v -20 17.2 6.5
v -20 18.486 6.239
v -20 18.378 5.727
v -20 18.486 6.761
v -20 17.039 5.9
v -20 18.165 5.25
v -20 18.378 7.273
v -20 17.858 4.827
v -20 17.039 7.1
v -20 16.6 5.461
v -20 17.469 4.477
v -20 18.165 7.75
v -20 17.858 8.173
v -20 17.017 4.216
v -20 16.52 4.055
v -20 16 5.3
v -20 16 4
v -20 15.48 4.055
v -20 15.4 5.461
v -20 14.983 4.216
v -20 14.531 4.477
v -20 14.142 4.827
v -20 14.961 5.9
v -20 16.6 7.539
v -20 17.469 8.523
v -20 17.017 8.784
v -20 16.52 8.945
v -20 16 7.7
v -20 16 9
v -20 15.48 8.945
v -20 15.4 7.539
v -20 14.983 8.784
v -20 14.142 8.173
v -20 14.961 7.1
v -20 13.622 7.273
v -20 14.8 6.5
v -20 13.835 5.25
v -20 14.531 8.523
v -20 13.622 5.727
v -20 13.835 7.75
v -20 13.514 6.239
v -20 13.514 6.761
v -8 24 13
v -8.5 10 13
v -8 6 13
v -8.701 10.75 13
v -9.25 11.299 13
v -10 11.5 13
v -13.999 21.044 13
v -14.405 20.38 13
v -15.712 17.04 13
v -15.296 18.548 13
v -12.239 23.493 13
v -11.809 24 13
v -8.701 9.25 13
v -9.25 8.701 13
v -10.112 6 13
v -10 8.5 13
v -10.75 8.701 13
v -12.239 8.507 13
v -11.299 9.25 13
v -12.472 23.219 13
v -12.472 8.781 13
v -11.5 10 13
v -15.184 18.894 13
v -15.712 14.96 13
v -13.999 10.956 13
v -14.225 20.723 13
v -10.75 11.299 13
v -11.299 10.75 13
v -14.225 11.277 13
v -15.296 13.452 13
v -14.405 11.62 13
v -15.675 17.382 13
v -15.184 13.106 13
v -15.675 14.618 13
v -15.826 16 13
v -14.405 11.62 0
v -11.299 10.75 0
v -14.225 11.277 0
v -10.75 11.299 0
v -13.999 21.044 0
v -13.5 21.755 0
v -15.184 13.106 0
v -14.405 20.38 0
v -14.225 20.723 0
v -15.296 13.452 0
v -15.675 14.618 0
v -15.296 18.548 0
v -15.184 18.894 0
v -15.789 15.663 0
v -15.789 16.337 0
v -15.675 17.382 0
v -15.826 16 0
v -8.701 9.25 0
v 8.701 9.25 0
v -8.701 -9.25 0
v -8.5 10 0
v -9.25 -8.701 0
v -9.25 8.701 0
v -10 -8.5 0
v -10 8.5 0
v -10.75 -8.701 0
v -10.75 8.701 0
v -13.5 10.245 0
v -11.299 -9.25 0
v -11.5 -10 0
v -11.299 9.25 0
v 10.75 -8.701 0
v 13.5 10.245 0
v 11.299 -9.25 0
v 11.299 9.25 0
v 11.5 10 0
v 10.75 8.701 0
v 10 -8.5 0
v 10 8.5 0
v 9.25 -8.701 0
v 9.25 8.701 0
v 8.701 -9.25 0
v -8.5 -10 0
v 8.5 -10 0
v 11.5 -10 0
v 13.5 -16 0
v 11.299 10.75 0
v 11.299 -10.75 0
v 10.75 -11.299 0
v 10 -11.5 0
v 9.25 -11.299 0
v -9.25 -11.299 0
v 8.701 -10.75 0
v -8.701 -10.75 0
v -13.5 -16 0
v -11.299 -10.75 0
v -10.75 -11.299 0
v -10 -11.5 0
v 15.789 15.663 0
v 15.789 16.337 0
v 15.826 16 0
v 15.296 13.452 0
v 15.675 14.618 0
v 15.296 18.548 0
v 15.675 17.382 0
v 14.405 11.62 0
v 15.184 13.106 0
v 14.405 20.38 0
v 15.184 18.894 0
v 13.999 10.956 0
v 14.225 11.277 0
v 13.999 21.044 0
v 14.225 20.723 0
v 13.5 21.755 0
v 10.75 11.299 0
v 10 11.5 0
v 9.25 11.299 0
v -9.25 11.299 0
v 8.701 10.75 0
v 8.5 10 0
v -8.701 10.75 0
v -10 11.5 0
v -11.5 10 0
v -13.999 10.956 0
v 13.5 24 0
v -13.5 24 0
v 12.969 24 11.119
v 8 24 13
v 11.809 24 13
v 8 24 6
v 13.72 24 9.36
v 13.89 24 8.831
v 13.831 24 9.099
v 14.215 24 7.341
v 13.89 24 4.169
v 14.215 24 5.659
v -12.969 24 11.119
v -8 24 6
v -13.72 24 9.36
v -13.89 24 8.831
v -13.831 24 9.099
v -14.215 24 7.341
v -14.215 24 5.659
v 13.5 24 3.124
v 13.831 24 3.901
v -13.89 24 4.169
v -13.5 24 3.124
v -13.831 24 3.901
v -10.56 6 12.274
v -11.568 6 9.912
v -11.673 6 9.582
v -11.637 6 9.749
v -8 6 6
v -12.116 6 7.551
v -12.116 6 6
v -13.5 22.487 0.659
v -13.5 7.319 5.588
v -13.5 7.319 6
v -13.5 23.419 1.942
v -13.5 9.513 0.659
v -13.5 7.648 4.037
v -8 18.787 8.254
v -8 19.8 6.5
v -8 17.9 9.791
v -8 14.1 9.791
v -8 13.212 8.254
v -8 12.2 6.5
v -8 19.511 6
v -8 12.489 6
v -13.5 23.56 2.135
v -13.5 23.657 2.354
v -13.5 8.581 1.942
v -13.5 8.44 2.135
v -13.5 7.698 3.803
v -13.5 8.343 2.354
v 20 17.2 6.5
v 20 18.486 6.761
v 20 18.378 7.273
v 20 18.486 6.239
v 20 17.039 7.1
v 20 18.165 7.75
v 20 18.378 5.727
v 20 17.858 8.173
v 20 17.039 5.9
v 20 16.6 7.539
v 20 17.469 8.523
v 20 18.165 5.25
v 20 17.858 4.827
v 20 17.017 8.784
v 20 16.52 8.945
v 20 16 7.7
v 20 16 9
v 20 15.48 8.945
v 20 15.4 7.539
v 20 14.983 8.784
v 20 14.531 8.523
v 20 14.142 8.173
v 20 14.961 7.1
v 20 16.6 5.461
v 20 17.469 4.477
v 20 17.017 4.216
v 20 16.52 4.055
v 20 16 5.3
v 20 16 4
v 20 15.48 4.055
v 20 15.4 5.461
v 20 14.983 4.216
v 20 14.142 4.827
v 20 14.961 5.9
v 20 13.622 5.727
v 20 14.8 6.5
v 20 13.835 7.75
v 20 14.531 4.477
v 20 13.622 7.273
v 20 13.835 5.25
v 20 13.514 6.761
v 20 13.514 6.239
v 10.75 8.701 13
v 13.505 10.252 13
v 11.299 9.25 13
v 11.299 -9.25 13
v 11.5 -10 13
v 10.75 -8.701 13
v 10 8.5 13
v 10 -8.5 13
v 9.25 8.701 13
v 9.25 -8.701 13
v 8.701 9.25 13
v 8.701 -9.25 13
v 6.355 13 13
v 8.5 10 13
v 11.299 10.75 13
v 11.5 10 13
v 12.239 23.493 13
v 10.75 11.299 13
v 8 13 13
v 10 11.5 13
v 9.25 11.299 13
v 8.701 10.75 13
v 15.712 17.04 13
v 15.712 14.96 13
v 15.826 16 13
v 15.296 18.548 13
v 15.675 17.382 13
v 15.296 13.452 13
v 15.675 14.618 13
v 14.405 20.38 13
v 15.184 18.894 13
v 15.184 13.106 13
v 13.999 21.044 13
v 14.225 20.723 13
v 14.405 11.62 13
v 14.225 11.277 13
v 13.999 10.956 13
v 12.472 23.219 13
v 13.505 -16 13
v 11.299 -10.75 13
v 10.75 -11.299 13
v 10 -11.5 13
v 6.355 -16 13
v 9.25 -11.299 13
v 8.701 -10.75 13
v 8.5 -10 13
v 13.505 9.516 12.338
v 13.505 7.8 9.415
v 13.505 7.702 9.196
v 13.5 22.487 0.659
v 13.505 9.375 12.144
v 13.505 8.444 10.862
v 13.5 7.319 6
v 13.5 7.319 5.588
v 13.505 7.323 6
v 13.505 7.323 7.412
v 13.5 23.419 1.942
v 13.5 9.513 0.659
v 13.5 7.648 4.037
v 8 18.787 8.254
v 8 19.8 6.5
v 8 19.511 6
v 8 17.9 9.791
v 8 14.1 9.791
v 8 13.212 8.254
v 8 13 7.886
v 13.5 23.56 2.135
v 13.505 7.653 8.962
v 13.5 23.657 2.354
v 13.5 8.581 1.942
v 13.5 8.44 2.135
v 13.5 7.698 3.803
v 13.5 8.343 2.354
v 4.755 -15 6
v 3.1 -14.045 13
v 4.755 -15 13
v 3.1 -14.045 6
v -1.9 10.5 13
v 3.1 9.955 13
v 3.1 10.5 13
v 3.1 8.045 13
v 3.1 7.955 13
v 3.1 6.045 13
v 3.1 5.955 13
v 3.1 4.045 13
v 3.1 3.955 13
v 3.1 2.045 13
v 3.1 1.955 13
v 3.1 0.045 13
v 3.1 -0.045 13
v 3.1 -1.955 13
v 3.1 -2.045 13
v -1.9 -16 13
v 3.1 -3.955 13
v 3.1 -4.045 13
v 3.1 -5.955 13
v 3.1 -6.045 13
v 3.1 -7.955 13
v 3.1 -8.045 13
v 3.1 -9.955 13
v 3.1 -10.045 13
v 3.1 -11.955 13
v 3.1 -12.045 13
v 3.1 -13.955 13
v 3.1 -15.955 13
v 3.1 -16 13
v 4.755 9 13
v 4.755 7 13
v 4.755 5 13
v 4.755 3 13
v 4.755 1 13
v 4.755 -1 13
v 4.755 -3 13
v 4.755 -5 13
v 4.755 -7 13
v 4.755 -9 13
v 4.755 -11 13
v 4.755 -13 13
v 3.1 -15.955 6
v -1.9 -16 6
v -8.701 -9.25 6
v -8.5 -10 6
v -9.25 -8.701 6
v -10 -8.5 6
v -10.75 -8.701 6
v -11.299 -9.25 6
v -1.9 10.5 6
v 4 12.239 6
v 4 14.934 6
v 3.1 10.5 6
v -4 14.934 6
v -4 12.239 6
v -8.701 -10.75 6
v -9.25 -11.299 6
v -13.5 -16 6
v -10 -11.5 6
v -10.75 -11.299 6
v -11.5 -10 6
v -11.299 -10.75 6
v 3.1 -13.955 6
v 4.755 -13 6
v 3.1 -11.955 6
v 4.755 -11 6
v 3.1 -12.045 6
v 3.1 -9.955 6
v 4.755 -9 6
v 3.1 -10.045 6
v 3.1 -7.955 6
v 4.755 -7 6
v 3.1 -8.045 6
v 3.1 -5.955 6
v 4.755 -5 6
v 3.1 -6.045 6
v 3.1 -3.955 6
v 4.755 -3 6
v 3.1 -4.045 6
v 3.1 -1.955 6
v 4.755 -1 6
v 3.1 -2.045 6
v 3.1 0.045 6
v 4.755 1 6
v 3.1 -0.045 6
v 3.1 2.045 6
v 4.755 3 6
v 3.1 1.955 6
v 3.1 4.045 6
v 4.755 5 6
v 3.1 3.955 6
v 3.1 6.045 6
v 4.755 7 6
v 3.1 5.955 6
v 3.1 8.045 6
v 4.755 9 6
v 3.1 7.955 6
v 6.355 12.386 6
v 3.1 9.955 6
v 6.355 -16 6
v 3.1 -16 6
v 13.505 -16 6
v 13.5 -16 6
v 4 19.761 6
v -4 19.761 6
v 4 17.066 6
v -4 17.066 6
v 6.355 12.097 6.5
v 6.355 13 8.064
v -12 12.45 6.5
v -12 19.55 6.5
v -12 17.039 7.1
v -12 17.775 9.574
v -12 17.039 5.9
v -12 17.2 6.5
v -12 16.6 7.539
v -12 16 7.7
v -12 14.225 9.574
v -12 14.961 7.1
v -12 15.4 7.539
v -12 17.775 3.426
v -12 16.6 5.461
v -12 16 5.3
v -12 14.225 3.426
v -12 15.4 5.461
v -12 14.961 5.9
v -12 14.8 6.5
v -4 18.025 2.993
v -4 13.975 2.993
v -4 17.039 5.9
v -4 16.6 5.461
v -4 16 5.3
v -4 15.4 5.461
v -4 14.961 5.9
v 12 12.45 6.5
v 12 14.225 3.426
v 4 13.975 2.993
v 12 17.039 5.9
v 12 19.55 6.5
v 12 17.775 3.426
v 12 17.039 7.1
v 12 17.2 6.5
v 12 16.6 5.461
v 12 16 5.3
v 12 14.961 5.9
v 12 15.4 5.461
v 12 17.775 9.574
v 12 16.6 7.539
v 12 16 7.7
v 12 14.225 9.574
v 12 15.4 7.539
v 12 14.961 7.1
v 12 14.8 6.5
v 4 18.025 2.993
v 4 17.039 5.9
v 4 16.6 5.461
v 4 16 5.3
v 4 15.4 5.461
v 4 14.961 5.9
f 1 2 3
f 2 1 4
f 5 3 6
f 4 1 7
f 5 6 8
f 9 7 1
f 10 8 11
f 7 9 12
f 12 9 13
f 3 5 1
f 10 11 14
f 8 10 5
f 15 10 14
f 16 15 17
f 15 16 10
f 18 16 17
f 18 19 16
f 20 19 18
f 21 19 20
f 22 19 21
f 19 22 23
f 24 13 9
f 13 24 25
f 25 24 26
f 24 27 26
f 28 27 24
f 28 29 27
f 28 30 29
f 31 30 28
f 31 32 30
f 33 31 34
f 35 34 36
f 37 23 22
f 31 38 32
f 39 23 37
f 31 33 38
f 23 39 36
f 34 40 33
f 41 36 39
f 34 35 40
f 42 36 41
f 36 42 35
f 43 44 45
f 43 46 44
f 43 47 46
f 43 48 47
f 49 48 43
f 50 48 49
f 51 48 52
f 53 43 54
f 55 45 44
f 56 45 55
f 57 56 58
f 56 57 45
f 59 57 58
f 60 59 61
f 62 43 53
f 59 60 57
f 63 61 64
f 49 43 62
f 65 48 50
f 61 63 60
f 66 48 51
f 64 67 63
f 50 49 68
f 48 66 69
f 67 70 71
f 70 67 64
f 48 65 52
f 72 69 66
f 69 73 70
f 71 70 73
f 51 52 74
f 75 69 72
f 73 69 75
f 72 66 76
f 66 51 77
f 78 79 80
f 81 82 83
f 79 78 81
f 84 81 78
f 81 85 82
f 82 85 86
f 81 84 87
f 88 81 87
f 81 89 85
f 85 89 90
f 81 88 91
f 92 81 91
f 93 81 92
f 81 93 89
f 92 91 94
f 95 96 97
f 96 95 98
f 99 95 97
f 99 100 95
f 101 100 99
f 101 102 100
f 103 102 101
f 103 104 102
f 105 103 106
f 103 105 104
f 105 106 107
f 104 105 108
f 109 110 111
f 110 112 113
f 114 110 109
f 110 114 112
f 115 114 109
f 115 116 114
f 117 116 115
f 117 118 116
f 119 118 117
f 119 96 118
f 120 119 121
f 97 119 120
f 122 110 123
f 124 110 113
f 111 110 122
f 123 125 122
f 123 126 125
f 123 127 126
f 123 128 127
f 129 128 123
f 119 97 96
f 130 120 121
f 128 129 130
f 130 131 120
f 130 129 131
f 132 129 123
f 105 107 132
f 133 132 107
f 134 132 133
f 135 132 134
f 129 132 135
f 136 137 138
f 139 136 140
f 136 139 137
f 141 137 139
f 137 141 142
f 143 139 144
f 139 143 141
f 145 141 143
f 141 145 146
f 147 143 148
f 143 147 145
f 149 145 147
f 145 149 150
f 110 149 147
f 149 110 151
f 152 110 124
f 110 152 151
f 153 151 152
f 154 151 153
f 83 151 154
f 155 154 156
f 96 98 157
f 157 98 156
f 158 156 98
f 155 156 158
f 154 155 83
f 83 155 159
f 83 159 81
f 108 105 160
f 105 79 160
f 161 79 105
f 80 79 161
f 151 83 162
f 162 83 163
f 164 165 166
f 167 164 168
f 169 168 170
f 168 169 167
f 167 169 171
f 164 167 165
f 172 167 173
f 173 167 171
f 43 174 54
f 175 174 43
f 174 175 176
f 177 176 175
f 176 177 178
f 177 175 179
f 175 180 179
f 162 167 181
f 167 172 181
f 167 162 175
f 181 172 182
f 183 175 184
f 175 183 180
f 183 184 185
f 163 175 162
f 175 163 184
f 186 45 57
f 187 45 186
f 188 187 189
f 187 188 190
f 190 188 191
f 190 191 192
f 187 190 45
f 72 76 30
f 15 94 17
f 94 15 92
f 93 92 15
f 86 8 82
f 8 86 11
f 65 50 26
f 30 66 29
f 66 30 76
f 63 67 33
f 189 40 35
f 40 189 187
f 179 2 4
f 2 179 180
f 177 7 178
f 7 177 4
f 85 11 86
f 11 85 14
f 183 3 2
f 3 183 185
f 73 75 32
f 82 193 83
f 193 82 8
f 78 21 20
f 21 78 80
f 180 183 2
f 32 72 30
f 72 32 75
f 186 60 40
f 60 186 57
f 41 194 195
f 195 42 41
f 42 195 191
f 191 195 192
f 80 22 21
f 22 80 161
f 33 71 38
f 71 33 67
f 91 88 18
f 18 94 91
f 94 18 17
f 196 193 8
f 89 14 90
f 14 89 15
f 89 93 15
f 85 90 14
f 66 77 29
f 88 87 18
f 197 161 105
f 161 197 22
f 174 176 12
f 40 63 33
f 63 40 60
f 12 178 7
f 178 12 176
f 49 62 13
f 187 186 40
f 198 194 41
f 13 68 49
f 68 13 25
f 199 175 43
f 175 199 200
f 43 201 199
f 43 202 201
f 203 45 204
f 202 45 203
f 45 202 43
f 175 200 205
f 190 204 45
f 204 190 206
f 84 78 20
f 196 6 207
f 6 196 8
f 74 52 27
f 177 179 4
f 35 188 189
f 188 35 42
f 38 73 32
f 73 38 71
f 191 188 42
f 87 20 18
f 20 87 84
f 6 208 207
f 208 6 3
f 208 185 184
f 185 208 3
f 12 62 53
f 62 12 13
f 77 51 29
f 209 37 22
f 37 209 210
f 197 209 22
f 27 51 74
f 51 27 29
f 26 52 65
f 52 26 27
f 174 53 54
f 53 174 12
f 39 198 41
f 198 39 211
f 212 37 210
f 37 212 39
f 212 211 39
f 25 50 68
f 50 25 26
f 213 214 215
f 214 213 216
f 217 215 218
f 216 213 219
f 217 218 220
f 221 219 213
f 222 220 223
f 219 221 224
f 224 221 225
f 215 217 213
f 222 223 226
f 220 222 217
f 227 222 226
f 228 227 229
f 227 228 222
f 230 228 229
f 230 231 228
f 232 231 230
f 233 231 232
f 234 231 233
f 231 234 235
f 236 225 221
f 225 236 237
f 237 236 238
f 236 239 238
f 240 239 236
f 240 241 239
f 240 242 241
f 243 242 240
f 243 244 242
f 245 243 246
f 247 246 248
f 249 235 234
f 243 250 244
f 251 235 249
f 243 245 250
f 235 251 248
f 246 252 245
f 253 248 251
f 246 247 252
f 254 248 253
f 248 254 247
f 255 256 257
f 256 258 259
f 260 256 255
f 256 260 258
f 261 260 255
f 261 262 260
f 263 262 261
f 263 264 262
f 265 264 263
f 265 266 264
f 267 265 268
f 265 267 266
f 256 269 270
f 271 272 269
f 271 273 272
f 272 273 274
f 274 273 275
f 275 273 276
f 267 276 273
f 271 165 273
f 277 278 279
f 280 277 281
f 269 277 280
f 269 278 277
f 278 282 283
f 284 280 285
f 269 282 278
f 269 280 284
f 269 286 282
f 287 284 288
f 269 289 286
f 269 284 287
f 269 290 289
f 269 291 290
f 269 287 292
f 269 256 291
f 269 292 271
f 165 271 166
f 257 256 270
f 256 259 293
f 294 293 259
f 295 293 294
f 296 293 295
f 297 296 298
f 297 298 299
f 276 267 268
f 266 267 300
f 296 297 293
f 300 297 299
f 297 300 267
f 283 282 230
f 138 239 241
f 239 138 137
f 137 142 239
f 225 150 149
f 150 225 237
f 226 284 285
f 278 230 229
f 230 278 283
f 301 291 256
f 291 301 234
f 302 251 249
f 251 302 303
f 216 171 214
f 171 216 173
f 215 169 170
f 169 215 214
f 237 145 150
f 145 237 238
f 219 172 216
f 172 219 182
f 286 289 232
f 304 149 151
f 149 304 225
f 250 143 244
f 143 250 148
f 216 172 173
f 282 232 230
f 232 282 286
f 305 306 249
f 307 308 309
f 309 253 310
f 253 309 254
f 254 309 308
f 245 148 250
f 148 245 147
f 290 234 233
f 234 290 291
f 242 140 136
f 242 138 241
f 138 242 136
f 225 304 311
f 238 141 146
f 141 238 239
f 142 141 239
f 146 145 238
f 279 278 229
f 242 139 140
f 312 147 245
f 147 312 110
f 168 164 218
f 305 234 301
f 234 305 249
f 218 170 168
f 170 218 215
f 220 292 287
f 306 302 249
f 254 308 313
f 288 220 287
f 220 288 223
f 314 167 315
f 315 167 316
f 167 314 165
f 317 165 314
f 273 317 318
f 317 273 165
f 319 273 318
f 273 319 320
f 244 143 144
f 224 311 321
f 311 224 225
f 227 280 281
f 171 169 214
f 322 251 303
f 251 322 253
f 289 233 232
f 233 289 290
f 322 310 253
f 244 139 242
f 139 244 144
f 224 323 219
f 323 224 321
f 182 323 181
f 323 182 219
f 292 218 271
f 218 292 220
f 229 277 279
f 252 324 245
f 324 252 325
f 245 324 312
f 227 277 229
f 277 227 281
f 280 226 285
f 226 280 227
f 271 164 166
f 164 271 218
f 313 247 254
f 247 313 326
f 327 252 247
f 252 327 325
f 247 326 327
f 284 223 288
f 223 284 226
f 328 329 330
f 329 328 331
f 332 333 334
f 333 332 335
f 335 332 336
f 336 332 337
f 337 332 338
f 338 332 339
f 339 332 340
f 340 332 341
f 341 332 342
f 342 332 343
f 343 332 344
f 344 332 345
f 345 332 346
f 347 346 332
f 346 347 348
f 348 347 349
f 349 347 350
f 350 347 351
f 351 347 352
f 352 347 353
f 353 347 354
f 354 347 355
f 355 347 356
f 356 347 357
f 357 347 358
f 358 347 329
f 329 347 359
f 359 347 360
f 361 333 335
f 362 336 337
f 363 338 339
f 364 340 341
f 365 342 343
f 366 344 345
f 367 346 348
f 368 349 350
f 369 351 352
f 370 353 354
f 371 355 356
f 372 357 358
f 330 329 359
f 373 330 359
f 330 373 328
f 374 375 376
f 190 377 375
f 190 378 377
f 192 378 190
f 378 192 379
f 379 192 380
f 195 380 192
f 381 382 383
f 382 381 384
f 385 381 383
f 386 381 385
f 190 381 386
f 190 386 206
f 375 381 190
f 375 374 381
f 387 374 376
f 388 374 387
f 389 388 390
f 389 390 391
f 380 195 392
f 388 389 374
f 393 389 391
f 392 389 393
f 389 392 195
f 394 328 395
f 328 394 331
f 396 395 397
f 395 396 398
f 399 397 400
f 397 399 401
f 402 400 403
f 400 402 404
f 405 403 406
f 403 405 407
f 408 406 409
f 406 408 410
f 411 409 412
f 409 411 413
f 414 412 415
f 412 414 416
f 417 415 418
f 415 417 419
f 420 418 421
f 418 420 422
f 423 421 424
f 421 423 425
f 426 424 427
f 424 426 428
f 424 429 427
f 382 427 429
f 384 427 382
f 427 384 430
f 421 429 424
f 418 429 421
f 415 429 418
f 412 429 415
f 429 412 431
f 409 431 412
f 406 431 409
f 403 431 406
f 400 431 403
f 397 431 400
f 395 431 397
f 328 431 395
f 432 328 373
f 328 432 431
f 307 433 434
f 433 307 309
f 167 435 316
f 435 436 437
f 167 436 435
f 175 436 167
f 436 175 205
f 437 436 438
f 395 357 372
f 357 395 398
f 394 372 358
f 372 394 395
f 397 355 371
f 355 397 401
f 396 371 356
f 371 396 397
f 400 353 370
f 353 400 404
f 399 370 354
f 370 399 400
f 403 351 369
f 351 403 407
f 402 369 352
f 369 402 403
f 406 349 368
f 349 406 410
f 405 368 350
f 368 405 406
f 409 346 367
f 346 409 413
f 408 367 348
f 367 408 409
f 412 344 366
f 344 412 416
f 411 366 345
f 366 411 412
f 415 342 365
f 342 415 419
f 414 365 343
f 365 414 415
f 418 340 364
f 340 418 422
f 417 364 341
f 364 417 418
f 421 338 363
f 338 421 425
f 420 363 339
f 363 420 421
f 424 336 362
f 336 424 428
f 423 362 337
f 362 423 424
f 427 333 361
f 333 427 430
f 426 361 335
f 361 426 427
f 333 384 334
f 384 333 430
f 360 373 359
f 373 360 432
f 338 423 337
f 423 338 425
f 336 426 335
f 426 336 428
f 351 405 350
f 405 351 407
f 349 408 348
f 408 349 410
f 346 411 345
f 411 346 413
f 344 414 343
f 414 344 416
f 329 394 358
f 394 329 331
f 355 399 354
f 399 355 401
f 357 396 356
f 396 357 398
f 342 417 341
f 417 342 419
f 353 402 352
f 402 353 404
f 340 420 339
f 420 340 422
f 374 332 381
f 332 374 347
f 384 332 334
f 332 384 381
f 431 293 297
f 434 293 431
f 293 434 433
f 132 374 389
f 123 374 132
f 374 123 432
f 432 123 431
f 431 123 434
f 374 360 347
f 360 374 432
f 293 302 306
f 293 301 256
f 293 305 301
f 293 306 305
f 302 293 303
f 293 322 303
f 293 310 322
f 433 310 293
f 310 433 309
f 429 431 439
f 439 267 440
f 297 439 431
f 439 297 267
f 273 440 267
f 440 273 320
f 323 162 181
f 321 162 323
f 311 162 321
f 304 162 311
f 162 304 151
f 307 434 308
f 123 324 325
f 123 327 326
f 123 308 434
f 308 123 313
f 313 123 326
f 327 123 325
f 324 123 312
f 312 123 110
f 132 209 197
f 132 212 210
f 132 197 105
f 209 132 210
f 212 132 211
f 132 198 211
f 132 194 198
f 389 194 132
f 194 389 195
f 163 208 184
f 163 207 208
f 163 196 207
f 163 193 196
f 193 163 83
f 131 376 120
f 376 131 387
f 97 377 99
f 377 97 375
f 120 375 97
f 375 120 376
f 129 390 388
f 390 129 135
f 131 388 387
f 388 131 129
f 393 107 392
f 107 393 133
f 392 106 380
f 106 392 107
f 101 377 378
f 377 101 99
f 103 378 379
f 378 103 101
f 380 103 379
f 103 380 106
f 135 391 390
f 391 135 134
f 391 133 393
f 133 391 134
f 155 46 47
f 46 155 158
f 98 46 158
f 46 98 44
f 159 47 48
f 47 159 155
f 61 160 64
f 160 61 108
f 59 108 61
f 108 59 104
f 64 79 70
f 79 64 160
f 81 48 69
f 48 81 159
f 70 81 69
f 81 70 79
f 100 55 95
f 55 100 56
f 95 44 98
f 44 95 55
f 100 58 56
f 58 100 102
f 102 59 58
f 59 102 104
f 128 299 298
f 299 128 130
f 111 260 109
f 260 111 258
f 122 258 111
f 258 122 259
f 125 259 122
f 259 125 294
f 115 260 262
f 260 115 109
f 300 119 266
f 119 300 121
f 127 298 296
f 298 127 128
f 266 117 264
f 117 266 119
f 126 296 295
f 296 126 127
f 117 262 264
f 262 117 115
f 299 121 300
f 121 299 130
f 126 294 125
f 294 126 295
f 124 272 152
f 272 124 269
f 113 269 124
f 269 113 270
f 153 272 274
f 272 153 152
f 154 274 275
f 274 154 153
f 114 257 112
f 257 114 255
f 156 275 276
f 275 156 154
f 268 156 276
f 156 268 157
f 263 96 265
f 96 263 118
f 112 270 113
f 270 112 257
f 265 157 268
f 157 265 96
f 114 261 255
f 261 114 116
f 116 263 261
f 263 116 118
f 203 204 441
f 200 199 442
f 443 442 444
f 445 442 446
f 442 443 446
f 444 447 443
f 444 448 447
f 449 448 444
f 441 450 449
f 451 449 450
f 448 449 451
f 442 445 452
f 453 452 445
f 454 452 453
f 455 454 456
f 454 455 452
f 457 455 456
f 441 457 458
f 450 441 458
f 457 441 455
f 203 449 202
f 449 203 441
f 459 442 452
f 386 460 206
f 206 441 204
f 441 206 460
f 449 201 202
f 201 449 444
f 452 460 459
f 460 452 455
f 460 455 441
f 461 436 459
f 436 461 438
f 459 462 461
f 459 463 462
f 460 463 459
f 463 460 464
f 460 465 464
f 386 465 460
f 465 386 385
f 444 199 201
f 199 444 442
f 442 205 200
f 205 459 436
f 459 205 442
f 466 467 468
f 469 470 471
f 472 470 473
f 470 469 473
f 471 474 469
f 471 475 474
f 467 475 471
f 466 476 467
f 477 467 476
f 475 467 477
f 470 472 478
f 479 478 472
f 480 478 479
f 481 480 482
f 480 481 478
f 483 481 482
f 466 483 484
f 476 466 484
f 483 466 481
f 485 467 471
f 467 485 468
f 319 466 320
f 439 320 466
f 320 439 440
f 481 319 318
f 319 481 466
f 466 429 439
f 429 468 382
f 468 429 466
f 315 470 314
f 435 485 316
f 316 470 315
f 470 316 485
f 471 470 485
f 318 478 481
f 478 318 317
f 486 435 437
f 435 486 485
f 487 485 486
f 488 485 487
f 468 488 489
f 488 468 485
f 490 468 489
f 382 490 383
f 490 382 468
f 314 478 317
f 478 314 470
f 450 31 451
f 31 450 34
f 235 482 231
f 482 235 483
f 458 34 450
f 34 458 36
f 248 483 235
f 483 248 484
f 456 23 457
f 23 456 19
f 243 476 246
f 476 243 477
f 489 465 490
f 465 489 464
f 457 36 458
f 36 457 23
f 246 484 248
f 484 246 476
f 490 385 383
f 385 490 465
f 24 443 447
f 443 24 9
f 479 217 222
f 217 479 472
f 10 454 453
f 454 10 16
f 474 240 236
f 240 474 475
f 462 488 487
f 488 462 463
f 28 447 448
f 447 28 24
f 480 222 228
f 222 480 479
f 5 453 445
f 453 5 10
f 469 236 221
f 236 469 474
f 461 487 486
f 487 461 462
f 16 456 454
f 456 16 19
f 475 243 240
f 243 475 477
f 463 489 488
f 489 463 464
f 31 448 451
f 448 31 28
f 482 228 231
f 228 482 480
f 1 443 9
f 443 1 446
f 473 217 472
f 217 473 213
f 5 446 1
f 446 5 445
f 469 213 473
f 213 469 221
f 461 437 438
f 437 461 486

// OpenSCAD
// file: configuration.scad
// Increase this if your slicer or printer make holes too tight.
extra_radius = 0.30;

// OD = outside diameter, corner to corner.
//六角螺母
m3_nut_od = 6.1;
m3_nut_radius = m3_nut_od/2 + 0.2 + extra_radius;
m4_nut_od = 8;
m4_nut_radius = m4_nut_od/2 + 0.2 +extra_radius;
m3_nut_height = 2.4;
m4_nut_height = 3.2;

// Major diameter of metric 3mm thread.
m3_major = 2.85;
m3_radius = m3_major/2 + extra_radius;
m3_wide_radius = m3_major/2 + extra_radius + 0.2;

// NEMA17 stepper motors.
motor_shaft_diameter = 5;
motor_shaft_radius = motor_shaft_diameter/2 + extra_radius;

// Frame brackets. M3x8mm screws work best with 3.6 mm brackets.
thickness = 3.6;

// OpenBeam or Misumi. Currently only 15x15 mm, but there is a plan
// to make models more parametric and allow 20x20 mm in the future.
//extrusion = 15;
extrusion = 20;
//extrusion_block_width = 2.5; //15x15
extrusion_block_width = 6.1; //20x20

//corner_radius = 36; //15x15
corner_radius = 40; //20x20

//extrusion_offset = 0;//15x15
extrusion_offset = -2.5; //20x20

//height_offset = 0; //15x15
height_offset = -extrusion_offset; //20x20

//screw_offset=-7.5; //15x15
screw_offset=-12; //20x20
// main file
include <configuration.scad>;

separation = 40;
thickness = 6;

horn_thickness = 13;
horn_x = 8;

belt_width = 5;
belt_x = 5.6;
belt_z = 7;
belt_gas = 1/cos(30)+0.7+0.2+extra_radius;

module carriage() {
  // Timing belt (up and down).
  translate([-belt_x, 0, belt_z + belt_width/2]) %
    cube([1.7, 100, belt_width], center=true);
  translate([belt_x, 0, belt_z + belt_width/2]) %
    cube([1.7, 100, belt_width], center=true);
  difference() {
    union() {
      // Main body.
      translate([0, 4, thickness/2])
        cube([27, 40, thickness], center=true);
      // Ball joint mount horns.
      for (x = [-1, 1]) {
        scale([x, 1, 1]) intersection() {
          translate([0, 15, horn_thickness/2])
            cube([separation, 18, horn_thickness], center=true);
          translate([horn_x, 16, horn_thickness/2]) rotate([0, 90, 0])
            cylinder(r1=14, r2=2.5, h=separation/2-horn_x);
        }
      }//for
      // Belt clamps.
      difference() {
        union() {
      //   translate([6.5, -2.5, horn_thickness/2+1])
      //      cube([14, 7, horn_thickness-2], center=true);
      //   translate([10.75, 2.5, horn_thickness/2+1])
      //      cube([5.5, 16, horn_thickness-2], center=true);
        }
        // Avoid touching diagonal push rods (carbon tube).
      //  translate([20, -10, 12.5]) rotate([35, 35, 30])
      //    cube([40, 40, 20], center=true);
      }
//卡带槽
	union()
	{
		translate([5-1-0.4, -15, thickness])gt2(w=7,l=25);
//		translate([5-1, -15+16, thickness])gt2(w=7,l=10);
		translate([-2-1+0.9+0.2,-16,thickness])cube([5,26.5,7]);
//		translate([-2.5-1,-16+16,thickness])cube([7,12,7]);
//		translate([5-3, -15+11.5, thickness])rotate([0,0,90])gt2(w=7,l=5);
//		translate([-2, -15+14.5, thickness])rotate([0,0,-90])gt2(w=7,l=5);
		translate([5-1+belt_gas,-16,thickness])cube([7+0.15,26+3,7]);
	}
 /*     for (y = [-12, 7]) {
    #    translate([1.25, y, thickness+4])
          cube([7, 8, 8], center=true);
      } */
    }//union
    // Screws for linear slider.
    for (x = [-10, 10]) {
      for (y = [-10, 10]) {
        translate([x, y, thickness]) 
          cylinder(r=1.5, h=30, center=true, $fn=12);
      }
    }
    // Screws for ball joints.
    translate([0, 16, horn_thickness/2]) rotate([0, 90, 0]) 
      cylinder(r=1.2, h=60, center=true, $fn=12);
    // Lock nuts for ball joints.
    for (x = [-1, 1]) {
      scale([x, 1, 1]) intersection() {
        translate([horn_x, 16, horn_thickness/2]) rotate([90, 0, -90])
          cylinder(r1=m3_nut_radius, r2=m3_nut_radius+0.5, h=8,
                   center=true, $fn=6);
      }
    }
  }
}
//GT2齿面
module gt2(l,w)
{
	//cube([1,l,w]);
	for(n=[0:2:l])
	{
		translate([0,n,0])cylinder(r=1/cos(30),h=w,$fn=3);
	}
}

module test_gt2(s)
{
	union()
	{
		gt2(w=6,l=20);
		translate([-4.5,0,-3])cube([11,20,3]);
		translate([1/cos(30)+s+0.2+extra_radius,0,0])cube([4,20,6]);
		translate([-4.5,0,0])cube([4,20,6]);
	}
}

//translate([0,0,10])test_gt2(s=0.7);
carriage();
